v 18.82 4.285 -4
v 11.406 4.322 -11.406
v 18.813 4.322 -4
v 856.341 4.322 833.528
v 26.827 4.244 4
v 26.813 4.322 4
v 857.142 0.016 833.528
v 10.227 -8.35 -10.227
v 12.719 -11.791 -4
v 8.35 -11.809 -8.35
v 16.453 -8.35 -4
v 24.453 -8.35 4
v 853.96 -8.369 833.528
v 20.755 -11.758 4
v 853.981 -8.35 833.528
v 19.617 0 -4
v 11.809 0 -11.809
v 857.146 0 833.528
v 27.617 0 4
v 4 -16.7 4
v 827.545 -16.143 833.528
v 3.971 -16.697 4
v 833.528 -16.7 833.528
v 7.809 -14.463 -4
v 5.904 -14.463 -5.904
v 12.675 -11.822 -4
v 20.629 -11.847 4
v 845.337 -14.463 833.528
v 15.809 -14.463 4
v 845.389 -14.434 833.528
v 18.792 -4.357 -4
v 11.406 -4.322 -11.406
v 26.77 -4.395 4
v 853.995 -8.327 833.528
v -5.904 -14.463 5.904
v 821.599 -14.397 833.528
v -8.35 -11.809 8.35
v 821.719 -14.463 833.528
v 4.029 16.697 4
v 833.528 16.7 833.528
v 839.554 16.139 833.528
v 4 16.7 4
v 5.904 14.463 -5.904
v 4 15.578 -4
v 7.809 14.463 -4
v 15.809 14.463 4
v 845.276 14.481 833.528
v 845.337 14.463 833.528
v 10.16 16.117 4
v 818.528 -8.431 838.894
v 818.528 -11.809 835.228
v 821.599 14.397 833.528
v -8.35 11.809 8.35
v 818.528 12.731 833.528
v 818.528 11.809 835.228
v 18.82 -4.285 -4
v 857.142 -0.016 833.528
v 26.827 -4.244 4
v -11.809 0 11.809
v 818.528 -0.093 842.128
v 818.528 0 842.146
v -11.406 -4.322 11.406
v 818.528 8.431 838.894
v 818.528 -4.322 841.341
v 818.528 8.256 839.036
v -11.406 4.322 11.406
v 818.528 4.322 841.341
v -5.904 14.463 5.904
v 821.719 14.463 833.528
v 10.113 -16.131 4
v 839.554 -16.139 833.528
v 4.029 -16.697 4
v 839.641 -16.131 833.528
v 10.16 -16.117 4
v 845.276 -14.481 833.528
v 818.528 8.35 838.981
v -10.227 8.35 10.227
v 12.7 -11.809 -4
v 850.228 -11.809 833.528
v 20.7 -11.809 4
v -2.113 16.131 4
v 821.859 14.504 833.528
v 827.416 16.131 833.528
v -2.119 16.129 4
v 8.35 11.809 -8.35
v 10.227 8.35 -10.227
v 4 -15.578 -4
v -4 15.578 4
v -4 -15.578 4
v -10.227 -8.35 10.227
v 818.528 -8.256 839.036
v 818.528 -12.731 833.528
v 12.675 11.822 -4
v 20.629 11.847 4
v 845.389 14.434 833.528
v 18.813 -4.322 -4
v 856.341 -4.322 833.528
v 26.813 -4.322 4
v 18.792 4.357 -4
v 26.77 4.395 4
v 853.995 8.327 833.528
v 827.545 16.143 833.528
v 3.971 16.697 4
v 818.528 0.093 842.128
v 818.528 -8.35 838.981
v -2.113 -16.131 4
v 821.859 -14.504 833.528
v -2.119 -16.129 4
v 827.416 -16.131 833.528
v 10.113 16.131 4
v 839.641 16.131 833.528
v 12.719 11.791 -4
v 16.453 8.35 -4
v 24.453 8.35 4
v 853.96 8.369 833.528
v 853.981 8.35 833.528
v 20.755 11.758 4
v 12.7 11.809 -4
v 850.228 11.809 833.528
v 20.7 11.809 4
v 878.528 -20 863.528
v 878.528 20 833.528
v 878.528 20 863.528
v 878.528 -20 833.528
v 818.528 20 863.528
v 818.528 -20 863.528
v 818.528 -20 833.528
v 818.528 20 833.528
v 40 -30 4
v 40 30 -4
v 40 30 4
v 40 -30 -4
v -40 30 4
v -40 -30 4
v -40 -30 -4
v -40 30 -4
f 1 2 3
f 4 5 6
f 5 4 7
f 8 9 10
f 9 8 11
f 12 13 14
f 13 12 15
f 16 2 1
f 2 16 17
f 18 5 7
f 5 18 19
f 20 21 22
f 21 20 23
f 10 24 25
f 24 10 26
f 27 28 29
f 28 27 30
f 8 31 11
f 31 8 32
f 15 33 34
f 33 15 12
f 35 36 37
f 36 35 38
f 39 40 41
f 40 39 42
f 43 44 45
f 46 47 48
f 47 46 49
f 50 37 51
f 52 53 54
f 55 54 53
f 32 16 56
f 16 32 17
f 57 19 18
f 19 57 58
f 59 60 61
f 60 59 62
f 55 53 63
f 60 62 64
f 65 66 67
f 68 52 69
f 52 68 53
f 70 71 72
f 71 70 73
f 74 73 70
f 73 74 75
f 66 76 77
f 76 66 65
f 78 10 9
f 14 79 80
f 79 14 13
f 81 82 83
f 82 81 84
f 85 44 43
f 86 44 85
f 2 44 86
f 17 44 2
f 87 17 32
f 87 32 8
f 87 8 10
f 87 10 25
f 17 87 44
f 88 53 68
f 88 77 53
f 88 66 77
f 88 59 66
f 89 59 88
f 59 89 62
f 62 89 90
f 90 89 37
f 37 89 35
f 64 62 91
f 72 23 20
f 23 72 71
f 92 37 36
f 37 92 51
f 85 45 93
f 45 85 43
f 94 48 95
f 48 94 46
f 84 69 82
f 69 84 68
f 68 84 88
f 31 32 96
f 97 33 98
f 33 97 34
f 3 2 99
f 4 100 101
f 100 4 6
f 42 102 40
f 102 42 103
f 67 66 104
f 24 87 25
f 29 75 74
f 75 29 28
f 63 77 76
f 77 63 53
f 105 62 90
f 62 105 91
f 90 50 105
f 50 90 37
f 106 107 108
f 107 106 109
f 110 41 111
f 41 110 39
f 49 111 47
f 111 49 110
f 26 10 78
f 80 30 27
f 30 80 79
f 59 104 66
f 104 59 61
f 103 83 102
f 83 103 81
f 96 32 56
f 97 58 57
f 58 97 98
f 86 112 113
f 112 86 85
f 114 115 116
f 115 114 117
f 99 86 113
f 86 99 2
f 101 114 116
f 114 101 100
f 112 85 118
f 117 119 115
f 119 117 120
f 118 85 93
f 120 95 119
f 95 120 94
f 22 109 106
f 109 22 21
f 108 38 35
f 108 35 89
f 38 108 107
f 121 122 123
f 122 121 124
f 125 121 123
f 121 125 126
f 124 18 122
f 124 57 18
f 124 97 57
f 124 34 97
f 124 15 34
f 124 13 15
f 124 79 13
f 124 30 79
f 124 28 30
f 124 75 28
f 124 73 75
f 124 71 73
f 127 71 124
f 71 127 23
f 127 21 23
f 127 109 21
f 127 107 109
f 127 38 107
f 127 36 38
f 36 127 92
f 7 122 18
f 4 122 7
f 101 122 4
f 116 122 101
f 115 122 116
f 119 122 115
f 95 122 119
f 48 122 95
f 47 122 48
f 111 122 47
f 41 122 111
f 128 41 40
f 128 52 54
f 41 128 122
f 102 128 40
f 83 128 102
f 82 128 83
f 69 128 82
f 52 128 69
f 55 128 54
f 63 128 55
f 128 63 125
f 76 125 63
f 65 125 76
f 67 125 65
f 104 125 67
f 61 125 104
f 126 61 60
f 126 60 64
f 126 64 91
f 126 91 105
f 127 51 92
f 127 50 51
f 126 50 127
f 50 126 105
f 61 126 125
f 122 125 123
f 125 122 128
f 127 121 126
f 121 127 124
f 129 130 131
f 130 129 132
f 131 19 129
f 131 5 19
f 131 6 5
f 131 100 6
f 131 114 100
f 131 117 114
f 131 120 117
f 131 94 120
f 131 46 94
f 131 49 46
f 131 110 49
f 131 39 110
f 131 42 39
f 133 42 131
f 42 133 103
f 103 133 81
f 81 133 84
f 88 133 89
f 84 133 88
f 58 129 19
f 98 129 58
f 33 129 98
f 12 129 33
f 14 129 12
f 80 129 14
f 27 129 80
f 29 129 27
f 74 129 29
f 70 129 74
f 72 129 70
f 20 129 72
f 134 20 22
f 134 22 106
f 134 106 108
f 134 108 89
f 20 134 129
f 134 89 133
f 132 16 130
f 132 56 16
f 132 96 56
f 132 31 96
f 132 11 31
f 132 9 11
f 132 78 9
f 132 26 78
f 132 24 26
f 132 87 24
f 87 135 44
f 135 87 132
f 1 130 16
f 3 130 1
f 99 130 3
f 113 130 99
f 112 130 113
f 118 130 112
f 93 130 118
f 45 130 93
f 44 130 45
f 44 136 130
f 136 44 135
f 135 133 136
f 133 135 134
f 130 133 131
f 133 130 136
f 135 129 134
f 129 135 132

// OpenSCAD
// Seismic sway brace — diagonal strut (NFPA 13 §18).
brace_l = 1200;
brace_od = 33.4;  // 1" pipe brace
angle_deg = 45;
rotate([0, angle_deg, 0])
    cylinder(h = brace_l, d = brace_od, $fn = 24);
// Pipe attachment fitting at top end
translate([brace_l * sin(angle_deg), 0, brace_l * cos(angle_deg)])
    cube(size = [60, 40, 30], center = true);
// Structural attachment plate at bottom
cube(size = [80, 60, 8], center = true);
